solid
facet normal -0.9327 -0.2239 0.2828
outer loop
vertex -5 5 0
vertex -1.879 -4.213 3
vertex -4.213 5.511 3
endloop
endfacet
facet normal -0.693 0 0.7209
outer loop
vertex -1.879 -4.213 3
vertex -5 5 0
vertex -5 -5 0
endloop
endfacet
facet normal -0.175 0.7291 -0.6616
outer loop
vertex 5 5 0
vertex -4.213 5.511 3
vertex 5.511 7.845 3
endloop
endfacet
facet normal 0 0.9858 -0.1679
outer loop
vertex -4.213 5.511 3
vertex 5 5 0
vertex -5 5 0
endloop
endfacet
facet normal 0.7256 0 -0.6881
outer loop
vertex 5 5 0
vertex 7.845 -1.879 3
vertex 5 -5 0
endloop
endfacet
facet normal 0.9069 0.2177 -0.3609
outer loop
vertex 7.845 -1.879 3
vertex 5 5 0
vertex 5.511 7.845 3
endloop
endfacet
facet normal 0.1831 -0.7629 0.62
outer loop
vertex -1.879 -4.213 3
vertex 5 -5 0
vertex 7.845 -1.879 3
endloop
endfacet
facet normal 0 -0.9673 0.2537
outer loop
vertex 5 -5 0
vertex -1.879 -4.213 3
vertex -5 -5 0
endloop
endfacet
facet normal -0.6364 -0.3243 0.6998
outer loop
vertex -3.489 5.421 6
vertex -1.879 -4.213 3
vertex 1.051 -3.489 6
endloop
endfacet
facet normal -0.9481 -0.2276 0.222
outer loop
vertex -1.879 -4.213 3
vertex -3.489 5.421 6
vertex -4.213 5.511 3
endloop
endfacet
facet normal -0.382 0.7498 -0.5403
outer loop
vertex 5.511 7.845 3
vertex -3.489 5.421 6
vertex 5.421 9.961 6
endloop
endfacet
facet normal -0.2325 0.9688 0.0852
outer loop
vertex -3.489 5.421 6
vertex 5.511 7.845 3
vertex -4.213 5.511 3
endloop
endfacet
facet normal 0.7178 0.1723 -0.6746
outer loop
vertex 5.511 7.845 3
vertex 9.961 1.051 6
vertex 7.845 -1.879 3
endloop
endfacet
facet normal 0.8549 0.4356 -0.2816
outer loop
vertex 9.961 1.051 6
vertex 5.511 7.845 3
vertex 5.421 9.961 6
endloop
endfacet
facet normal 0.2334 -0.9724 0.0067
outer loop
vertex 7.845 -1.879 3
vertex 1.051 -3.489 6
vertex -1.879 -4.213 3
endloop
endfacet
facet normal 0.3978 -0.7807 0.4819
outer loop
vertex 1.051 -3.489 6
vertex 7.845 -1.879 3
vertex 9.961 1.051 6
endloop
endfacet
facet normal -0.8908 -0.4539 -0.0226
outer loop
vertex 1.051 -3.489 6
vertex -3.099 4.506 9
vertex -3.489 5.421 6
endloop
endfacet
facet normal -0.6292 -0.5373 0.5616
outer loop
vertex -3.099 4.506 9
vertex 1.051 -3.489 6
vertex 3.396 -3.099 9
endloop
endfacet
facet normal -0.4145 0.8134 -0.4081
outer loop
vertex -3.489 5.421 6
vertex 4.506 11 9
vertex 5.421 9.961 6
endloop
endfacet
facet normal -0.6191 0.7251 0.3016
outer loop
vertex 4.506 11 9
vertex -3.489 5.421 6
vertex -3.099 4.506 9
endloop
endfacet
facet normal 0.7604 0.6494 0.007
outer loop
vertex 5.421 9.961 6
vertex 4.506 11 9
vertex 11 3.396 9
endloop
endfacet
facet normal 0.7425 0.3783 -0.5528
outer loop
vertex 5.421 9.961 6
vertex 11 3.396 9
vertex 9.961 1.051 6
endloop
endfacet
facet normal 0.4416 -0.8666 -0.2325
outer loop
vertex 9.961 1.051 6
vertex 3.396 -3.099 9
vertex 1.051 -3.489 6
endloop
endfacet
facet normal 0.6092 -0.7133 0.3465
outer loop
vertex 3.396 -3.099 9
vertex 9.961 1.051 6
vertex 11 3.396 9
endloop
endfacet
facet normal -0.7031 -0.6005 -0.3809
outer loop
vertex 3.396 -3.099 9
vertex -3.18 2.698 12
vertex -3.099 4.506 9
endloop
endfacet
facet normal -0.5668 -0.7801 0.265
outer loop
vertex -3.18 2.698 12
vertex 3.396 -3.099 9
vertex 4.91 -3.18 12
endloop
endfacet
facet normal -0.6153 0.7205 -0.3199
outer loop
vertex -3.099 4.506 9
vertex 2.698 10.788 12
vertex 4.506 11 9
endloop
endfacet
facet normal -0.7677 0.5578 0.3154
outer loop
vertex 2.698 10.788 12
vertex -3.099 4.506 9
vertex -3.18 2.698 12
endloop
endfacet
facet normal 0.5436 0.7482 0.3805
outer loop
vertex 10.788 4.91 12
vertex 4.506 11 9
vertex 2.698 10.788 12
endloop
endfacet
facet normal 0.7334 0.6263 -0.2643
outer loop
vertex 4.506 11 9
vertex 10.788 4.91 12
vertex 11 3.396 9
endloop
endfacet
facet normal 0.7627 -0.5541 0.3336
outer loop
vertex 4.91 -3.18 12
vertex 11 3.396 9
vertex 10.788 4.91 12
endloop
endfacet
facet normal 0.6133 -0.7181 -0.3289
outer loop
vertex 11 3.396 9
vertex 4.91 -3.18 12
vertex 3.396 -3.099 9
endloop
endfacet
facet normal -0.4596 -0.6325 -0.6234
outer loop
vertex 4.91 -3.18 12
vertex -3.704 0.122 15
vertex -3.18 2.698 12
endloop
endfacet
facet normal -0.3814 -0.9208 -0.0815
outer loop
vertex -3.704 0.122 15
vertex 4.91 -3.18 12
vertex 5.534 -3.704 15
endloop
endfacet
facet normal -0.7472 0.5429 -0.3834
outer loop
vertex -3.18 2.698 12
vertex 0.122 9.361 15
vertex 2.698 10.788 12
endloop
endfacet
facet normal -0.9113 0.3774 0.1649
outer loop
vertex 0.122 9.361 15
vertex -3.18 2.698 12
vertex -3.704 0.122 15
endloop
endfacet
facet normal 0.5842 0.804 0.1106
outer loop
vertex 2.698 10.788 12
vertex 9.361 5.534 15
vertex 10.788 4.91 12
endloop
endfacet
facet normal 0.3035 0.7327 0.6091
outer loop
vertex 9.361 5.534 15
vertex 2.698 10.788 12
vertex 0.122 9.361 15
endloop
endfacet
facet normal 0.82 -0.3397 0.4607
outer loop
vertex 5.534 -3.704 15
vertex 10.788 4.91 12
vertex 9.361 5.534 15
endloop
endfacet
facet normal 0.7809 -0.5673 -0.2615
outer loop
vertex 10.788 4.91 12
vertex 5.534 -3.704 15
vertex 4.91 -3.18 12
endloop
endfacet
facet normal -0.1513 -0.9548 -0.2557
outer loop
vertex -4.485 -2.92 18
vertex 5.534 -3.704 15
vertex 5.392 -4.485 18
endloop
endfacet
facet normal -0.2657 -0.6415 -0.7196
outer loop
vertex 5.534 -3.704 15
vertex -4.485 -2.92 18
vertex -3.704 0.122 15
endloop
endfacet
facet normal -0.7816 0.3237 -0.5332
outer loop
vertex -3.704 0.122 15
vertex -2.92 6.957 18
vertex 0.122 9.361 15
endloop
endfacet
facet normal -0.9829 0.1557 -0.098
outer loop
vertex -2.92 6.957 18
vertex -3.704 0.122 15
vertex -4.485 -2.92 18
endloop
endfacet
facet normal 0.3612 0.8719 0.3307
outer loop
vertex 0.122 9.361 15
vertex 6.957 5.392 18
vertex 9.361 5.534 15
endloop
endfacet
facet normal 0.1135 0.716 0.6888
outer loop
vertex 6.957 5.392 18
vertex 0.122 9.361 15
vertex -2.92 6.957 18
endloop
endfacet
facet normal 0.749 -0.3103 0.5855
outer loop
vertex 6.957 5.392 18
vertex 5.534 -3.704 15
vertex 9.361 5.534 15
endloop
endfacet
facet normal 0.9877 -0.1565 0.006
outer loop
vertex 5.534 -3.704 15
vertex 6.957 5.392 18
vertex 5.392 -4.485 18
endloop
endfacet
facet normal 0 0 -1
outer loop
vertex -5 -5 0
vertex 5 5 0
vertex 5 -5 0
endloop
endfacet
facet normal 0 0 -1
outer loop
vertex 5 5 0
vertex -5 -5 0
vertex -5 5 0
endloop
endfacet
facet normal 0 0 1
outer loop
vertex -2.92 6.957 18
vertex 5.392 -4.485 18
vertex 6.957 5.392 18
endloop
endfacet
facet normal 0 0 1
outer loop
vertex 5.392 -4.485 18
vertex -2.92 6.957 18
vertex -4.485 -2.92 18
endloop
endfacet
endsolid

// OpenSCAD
polyhedron(points = [[-5, -5, 0], [-5, 5, 0], [5, 5, 0], [5, -5, 0], [-1.87866, -4.21311, 3], [-4.21311, 5.51058, 3], [5.51058, 7.84504, 3], [7.84504, -1.87866, 3], [1.05099, -3.48892, 6], [-3.48892, 5.42115, 6], [5.42115, 9.96105, 6], [9.96105, 1.05099, 6], [3.39596, -3.09852, 9], [-3.09852, 4.50554, 9], [4.50554, 11, 9], [11, 3.39596, 9], [4.91038, -3.17979, 12], [-3.17979, 2.69807, 12], [2.69807, 10.7882, 12], [10.7882, 4.91038, 12], [5.53441, -3.70439, 15], [-3.70439, 0.122447, 15], [0.122447, 9.36124, 15], [9.36124, 5.53441, 15], [5.39234, -4.48455, 18], [-4.48455, -2.9202, 18], [-2.9202, 6.95668, 18], [6.95668, 5.39234, 18]], faces = [[0, 1, 5, 4], [1, 2, 6, 5], [2, 3, 7, 6], [3, 0, 4, 7], [4, 5, 9, 8], [5, 6, 10, 9], [6, 7, 11, 10], [7, 4, 8, 11], [8, 9, 13, 12], [9, 10, 14, 13], [10, 11, 15, 14], [11, 8, 12, 15], [12, 13, 17, 16], [13, 14, 18, 17], [14, 15, 19, 18], [15, 12, 16, 19], [16, 17, 21, 20], [17, 18, 22, 21], [18, 19, 23, 22], [19, 16, 20, 23], [20, 21, 25, 24], [21, 22, 26, 25], [22, 23, 27, 26], [23, 20, 24, 27], [3, 2, 1, 0], [24, 25, 26, 27]]);
